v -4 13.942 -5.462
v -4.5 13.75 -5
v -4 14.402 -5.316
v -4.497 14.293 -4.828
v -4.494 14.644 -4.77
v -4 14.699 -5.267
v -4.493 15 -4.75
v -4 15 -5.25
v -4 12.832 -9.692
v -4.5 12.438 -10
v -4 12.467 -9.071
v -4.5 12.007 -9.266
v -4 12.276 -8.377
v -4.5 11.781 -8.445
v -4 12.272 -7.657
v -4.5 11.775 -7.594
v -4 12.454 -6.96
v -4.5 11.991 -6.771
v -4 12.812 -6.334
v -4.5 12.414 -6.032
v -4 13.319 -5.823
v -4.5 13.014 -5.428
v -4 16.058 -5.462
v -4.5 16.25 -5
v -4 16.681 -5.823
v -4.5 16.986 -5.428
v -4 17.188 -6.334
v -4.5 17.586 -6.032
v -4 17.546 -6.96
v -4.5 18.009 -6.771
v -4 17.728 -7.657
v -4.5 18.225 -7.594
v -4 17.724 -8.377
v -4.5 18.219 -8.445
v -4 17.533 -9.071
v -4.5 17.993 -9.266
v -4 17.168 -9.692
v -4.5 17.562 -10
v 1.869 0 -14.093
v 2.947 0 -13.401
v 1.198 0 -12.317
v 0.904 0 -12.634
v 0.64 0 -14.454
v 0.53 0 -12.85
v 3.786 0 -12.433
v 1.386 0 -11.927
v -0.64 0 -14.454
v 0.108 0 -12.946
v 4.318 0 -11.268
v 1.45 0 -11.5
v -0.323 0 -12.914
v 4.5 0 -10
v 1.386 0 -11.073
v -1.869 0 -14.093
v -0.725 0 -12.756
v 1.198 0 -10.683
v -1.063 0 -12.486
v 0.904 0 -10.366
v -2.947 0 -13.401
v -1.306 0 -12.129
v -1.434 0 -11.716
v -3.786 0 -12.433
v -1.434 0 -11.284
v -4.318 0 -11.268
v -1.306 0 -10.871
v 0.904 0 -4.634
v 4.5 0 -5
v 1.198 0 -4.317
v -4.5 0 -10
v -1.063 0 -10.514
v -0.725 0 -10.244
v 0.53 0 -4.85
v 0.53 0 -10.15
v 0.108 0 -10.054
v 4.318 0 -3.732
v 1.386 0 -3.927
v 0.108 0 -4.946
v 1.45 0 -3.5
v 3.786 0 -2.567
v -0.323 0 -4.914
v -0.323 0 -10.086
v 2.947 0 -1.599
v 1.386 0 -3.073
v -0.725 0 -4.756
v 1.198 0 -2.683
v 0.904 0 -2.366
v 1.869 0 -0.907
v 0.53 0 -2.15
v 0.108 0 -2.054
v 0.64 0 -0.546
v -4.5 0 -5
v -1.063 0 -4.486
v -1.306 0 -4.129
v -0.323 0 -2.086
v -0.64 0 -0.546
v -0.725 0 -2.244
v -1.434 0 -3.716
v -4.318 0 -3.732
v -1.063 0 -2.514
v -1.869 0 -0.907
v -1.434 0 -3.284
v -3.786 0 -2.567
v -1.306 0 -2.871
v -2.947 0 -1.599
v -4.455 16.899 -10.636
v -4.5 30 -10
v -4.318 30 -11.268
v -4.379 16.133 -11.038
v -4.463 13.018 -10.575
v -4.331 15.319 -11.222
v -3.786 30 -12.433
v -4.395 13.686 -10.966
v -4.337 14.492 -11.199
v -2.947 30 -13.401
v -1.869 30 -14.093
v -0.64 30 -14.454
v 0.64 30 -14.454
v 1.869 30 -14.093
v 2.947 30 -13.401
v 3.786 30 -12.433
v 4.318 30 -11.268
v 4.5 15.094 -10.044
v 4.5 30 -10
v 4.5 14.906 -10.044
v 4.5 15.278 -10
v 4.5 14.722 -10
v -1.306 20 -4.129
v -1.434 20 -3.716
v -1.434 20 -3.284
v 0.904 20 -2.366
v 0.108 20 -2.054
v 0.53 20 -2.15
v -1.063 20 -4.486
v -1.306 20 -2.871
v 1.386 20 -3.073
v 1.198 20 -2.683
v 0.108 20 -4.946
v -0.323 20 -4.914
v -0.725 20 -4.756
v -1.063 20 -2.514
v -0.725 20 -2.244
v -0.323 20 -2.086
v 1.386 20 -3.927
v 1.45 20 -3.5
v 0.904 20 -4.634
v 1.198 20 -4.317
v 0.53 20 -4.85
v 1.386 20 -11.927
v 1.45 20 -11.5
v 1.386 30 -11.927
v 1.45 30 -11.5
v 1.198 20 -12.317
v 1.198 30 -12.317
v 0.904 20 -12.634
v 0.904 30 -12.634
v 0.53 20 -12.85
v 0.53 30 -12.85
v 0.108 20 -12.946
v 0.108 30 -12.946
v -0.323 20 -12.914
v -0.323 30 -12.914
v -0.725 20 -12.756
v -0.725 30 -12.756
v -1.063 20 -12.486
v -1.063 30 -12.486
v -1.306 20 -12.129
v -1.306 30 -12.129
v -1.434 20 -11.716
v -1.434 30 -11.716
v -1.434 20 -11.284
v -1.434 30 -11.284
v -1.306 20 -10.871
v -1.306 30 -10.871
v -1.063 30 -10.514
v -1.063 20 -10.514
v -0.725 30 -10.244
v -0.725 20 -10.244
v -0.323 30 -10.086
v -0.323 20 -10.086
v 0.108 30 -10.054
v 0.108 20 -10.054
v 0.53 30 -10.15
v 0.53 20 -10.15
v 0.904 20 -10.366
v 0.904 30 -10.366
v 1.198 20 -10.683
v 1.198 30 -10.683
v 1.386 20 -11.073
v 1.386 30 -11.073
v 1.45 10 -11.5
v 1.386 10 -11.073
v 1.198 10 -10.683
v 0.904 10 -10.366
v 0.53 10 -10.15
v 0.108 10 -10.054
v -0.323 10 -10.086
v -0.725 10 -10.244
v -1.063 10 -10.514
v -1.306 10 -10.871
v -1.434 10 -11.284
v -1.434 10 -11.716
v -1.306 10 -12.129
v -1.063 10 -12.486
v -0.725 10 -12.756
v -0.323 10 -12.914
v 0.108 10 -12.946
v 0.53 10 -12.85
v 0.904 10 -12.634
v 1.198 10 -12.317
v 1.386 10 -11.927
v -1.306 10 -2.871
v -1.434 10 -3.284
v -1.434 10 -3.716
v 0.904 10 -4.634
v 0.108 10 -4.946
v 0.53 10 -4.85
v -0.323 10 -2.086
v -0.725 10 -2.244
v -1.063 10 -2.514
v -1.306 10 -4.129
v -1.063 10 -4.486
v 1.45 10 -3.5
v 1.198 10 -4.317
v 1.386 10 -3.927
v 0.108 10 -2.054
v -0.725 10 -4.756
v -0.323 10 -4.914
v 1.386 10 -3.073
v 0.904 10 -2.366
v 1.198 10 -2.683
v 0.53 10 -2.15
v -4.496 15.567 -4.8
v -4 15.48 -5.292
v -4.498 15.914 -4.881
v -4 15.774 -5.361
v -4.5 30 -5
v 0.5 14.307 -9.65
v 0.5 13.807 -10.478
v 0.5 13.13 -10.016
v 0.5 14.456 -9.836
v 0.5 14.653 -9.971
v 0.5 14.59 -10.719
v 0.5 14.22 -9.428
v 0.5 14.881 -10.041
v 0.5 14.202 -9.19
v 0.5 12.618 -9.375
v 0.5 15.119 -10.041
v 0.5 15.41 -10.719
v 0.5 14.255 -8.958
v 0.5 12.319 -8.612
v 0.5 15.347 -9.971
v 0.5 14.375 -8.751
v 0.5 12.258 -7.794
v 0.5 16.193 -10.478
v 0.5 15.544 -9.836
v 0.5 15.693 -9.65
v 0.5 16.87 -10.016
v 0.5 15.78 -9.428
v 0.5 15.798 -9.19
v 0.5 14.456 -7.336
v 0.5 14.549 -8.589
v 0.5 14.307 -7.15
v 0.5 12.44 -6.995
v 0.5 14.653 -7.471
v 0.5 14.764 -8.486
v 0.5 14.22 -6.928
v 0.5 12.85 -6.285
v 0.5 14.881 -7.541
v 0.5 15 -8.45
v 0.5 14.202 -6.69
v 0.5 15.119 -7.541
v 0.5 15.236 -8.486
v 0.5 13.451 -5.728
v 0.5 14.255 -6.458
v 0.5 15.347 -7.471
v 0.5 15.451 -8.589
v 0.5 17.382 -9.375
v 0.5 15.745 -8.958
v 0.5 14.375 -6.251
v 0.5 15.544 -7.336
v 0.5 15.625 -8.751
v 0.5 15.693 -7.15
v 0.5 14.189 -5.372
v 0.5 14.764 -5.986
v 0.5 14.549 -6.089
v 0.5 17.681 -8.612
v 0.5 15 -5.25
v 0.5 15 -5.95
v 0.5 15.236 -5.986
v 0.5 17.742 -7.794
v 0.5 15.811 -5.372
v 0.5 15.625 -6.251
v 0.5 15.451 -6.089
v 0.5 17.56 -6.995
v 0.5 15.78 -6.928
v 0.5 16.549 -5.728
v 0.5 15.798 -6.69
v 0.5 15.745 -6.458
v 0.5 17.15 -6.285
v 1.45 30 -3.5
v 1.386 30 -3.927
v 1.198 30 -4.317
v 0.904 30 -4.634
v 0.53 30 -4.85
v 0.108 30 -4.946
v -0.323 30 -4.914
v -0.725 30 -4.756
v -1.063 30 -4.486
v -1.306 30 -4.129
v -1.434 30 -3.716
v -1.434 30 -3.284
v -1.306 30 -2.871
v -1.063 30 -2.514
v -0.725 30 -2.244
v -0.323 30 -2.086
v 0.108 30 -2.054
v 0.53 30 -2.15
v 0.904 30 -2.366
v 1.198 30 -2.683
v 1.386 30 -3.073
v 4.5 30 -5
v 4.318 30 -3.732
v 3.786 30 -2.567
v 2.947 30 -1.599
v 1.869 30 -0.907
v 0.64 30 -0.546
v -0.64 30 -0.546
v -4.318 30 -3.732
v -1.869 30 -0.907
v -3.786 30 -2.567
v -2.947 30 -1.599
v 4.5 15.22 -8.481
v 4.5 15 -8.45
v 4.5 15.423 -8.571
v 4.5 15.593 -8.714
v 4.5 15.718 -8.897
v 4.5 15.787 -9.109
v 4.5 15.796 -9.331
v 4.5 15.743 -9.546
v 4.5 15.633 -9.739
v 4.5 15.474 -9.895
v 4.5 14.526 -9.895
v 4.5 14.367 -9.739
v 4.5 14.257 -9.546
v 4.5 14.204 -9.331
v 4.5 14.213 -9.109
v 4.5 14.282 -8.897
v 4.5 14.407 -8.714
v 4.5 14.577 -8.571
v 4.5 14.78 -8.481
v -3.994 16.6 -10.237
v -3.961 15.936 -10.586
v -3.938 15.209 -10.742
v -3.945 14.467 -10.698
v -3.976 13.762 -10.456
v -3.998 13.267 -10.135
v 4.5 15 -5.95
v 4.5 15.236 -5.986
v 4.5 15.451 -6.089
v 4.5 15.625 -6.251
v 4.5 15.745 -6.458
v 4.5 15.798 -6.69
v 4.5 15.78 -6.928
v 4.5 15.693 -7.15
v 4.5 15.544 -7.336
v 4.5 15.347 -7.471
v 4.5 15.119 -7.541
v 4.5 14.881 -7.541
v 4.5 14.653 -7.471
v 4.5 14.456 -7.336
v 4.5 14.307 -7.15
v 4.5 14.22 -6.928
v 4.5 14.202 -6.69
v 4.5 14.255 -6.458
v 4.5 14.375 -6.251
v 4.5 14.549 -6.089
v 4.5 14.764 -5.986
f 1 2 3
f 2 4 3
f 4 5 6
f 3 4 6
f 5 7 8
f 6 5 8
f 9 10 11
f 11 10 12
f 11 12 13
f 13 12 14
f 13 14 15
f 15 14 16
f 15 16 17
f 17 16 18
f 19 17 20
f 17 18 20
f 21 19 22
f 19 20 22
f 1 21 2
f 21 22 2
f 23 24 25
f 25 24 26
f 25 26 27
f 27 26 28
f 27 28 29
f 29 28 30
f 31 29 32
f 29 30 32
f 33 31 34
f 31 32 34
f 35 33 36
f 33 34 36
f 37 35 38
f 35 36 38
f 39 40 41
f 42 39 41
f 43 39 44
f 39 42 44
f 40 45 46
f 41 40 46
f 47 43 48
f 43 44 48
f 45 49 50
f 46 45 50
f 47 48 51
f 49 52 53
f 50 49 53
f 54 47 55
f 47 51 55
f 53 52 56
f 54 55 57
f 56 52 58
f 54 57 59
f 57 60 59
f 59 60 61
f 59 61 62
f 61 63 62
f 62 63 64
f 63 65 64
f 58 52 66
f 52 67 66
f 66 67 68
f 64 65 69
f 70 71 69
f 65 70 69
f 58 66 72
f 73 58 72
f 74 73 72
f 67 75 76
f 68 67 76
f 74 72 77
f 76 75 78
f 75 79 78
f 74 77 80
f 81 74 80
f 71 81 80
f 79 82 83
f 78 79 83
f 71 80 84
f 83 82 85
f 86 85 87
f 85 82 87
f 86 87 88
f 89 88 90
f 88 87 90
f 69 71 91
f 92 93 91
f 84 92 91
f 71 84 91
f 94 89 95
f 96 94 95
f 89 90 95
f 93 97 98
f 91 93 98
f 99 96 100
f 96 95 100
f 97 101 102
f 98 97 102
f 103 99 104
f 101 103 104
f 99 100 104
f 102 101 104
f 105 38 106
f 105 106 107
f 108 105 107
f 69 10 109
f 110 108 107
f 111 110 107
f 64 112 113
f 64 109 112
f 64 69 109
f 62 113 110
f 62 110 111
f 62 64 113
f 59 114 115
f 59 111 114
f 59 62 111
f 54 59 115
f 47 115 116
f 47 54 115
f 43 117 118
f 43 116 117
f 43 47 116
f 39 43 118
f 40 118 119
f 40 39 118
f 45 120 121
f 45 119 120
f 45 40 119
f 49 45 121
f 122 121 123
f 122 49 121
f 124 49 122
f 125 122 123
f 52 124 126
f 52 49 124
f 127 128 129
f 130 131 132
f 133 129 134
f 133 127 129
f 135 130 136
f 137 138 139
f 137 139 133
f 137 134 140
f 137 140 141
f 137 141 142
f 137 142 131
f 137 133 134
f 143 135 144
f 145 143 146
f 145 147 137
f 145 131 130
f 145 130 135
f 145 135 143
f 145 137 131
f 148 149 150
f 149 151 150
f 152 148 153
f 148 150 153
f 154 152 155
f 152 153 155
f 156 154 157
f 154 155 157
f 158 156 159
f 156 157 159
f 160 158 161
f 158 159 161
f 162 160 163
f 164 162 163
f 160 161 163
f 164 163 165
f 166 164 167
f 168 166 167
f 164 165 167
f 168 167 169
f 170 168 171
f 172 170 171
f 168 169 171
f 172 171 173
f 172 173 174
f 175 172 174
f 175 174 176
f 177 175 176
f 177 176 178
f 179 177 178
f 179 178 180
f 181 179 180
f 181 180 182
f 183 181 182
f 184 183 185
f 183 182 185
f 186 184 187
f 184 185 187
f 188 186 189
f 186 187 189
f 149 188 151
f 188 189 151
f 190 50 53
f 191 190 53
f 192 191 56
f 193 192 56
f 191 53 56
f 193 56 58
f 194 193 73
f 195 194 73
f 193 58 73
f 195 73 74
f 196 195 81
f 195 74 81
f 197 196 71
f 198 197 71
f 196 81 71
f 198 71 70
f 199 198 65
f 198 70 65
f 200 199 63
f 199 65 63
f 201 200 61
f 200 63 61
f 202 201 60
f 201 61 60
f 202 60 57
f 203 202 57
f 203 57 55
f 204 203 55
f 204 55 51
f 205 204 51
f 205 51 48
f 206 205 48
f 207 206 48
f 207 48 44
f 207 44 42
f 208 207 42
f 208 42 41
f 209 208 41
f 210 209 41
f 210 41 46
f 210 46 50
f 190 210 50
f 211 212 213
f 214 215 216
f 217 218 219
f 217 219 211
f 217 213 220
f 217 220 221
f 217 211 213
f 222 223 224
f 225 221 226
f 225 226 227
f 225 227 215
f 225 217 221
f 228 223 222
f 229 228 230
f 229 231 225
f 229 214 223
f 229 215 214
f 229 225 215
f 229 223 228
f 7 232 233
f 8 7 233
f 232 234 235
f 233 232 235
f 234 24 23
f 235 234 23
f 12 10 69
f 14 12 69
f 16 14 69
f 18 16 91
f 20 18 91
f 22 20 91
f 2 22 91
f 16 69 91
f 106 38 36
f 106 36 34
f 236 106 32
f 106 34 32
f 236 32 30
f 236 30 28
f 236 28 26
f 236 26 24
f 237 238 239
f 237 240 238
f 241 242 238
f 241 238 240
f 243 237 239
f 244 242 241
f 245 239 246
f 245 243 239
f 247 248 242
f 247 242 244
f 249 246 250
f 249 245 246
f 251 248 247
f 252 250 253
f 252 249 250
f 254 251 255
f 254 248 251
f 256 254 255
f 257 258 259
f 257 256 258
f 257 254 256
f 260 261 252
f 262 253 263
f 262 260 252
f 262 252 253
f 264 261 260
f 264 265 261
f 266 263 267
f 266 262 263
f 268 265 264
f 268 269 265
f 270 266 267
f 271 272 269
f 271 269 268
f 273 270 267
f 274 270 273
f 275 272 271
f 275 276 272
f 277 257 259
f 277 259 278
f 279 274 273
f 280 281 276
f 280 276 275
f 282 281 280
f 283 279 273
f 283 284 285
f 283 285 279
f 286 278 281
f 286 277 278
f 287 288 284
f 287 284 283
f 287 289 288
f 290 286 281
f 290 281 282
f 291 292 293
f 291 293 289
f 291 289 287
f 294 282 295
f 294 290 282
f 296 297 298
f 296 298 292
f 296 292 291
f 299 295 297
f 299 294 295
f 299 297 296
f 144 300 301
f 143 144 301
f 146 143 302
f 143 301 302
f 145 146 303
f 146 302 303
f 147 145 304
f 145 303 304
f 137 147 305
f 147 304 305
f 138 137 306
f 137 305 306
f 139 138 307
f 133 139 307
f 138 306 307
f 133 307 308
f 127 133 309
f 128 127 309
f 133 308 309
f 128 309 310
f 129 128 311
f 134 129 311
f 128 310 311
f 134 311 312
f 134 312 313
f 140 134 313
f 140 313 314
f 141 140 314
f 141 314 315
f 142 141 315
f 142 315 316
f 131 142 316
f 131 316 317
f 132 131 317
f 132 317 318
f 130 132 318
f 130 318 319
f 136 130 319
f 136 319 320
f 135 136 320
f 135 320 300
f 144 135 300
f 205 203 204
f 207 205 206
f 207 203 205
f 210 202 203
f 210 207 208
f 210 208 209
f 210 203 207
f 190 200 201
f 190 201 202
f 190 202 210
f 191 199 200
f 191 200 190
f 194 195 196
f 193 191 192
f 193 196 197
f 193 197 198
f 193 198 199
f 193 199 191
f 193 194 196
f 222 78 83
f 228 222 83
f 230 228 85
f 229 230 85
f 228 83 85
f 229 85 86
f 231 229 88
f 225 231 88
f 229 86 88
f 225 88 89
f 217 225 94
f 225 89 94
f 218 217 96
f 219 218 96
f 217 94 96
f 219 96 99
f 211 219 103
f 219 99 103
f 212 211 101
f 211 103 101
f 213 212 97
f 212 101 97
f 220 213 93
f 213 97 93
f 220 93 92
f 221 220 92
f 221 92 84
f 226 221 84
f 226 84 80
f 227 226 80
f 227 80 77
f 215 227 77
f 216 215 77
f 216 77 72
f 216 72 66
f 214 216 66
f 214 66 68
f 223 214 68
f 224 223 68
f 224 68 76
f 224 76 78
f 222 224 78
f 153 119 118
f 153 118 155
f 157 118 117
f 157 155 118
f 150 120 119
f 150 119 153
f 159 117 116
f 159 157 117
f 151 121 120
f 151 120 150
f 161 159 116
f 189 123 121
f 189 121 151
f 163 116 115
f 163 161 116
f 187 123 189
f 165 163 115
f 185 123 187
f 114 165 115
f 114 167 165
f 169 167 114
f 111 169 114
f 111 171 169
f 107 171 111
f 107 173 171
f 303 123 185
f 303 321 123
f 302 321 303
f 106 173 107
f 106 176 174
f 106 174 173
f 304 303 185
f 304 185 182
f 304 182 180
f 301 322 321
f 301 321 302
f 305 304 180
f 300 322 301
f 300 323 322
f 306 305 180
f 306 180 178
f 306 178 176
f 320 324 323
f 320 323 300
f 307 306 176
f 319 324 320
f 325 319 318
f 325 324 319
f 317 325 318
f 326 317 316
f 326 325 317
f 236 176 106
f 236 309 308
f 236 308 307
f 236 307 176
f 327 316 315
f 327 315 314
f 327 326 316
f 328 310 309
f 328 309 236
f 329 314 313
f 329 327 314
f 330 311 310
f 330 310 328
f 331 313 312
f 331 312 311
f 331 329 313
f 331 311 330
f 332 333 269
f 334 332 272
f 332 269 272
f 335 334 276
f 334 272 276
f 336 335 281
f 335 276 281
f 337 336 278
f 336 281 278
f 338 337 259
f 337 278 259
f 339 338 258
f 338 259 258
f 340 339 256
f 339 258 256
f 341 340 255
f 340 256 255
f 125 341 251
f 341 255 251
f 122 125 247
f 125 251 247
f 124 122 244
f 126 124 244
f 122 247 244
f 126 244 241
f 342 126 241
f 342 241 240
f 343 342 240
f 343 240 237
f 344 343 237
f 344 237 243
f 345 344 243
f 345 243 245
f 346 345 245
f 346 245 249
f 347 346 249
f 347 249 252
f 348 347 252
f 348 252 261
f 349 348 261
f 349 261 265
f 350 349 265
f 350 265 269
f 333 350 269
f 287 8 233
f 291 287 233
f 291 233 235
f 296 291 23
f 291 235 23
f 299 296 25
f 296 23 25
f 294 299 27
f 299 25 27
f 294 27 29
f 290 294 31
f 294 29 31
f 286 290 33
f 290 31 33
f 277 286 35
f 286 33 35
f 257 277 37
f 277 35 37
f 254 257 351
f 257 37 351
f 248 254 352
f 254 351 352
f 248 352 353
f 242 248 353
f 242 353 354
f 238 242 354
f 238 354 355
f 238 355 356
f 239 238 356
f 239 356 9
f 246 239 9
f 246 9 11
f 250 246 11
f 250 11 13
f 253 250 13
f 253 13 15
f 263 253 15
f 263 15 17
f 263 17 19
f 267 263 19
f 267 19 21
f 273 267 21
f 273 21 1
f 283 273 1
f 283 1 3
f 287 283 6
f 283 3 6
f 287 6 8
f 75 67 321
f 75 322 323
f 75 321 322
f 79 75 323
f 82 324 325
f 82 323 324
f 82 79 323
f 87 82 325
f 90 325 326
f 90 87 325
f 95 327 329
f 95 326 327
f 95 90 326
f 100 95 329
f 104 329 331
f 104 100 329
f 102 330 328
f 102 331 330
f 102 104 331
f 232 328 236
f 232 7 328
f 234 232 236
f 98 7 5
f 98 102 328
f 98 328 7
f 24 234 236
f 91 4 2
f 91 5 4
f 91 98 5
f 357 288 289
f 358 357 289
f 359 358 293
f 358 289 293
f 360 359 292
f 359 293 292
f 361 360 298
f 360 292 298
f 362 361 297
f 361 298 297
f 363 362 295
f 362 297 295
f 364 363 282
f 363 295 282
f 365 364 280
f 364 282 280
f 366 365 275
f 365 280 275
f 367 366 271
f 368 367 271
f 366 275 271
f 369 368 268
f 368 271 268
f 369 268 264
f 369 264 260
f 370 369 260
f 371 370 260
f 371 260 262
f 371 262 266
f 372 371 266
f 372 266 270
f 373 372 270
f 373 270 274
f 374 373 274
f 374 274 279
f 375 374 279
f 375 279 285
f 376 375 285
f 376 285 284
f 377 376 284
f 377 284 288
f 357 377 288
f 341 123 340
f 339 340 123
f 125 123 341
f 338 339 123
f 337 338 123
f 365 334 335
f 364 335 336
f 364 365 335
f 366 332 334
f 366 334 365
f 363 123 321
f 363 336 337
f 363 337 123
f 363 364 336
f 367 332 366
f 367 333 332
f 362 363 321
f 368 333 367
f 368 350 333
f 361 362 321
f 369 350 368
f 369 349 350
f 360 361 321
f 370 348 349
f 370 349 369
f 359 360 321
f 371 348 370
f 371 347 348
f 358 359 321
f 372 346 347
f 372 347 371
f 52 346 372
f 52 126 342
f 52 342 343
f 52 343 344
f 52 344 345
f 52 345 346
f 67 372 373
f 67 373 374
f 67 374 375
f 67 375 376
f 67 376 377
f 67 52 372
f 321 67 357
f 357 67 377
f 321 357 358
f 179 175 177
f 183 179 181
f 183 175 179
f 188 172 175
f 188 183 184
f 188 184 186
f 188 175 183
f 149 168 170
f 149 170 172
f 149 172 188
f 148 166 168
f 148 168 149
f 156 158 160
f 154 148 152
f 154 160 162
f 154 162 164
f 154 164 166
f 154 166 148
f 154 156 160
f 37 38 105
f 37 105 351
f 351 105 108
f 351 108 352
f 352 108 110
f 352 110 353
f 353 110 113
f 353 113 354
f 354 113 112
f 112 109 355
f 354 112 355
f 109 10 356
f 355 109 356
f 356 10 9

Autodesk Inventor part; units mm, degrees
ref_plane "YZ Plane" through (0, 0, 0) normal (1, 0, 0) x (0, 1, 0)
ref_plane "XZ Plane" through (0, 0, 0) normal (0, 1, 0) x (-1, 0, 0)
ref_plane "XY Plane" through (0, 0, 0) normal (0, 0, 1) x (1, 0, 0)
sketch "Sketch2" plane through (0, 0, 0) normal (0, 1, 0) x (-1, 0, 0)
  line L0 (-4.5, -10) -> (-4.5, -5)
  line L1 (4.5, -10) -> (4.5, -5)
  arc A0 (4.5, -5) -> (-4.5, -5) centre (0, -5) ccw
  arc A1 (-4.5, -10) -> (4.5, -10) centre (0, -10) ccw
  point P0 (0, 0)
  point P1 (0.9888, -13.1808)
  dimension "d75" = 5
  dimension "d76" = 5
extrude "Extrusion1" add sketch "Sketch2" along normal blind 30
sketch "Sketch14" plane through (-4.5, 0, -10) normal (-1, 0, 0) x (0, 0, 1)
  line L0 (-4.5, 0) -> (-4.5, 30) projected
  line L1 (-4.5, 0) -> (-4.5, 15)
  line L2 (-4.5, 15) -> (2, 15)
  circle A0 centre (2, 15) radius 2.75
  point P0 (10, 0)
  point P1 (-11.5, 30)
  dimension "d80" = 15
  dimension "d81" = 6.5
  dimension "d82" = 5.5
extrude "Extrusion13" cut sketch "Sketch14" against normal blind 5 and the other way blind 5
sketch "Sketch18" plane through (0, 30, 0) normal (0, 1, 0) x (1, 0, 0)
  arc A0 (4.5, 10) -> (-4.5, 10) centre (0, 10) ccw projected
  line L0 (0, 14.5) -> (0, 11.5)
  circle A1 centre (0, 11.5) radius 1.45
  arc A2 (-4.5, 5) -> (4.5, 5) centre (0, 5) ccw projected
  line L1 (0, 0.5) -> (0, 3.5)
  circle A3 centre (0, 3.5) radius 1.45
  point P0 (0, 0)
  dimension "d103" = 3
  dimension "d104" = 2.9
  dimension "d105" = 3
  dimension "d106" = 2.9
extrude "Extrusion17" cut sketch "Sketch18" against normal blind 10
sketch "Sketch19" plane through (0, 0, 0) normal (0, -1, 0) x (1, 0, 0)
  line L0 (4.5, -10) -> (4.5, -5) projected
  arc A0 (4.5, -5) -> (-4.5, -5) centre (0, -5) ccw projected
  line L1 (-4.5, -5) -> (-4.5, -10) projected
  arc A1 (-4.5, -10) -> (4.5, -10) centre (0, -10) ccw projected
  circle A2 centre (0, -11.5) radius 1.45 projected
  circle A3 centre (0, -3.5) radius 1.45 projected
extrude "Extrusion18" cut sketch "Sketch19" against normal blind 10 contours A2 | A3
sketch "Sketch20" plane through (0.5, 15, -8) normal (-1, 0, 0) x (0, 0, 1)
  circle A0 centre (0, 0) radius 2.75 projected
  line L0 (0, 0) -> (-1.25, 0)
  line L1 (0, 0) -> (1.25, 0) construction
  line L2 (0, 0) -> (1.25, 0)
  line L3 (0, 0) -> (1.25, 0) construction
  circle A1 centre (-1.25, 0) radius 0.8
  circle A2 centre (1.25, 0) radius 0.8
  point P0 (8, -15)
  dimension "d115" = 1.25
  dimension "d116" = 180
  dimension "d117" = 1.25
  dimension "d118" = 0
  dimension "d119" = 1.6
  dimension "d120" = 1.6
extrude "Extrusion19" cut sketch "Sketch20" against normal through all contours A1 | A2
chamfer "Chamfer5" distance 0.5 angle 45 3 edges at (-4.5, 12.4444, -6.9845) (-4.5, 17.5556, -6.9845) (-4.4371, 15.0001, -10.75)
properties part number "Front mount" material "ABS Plastic"
